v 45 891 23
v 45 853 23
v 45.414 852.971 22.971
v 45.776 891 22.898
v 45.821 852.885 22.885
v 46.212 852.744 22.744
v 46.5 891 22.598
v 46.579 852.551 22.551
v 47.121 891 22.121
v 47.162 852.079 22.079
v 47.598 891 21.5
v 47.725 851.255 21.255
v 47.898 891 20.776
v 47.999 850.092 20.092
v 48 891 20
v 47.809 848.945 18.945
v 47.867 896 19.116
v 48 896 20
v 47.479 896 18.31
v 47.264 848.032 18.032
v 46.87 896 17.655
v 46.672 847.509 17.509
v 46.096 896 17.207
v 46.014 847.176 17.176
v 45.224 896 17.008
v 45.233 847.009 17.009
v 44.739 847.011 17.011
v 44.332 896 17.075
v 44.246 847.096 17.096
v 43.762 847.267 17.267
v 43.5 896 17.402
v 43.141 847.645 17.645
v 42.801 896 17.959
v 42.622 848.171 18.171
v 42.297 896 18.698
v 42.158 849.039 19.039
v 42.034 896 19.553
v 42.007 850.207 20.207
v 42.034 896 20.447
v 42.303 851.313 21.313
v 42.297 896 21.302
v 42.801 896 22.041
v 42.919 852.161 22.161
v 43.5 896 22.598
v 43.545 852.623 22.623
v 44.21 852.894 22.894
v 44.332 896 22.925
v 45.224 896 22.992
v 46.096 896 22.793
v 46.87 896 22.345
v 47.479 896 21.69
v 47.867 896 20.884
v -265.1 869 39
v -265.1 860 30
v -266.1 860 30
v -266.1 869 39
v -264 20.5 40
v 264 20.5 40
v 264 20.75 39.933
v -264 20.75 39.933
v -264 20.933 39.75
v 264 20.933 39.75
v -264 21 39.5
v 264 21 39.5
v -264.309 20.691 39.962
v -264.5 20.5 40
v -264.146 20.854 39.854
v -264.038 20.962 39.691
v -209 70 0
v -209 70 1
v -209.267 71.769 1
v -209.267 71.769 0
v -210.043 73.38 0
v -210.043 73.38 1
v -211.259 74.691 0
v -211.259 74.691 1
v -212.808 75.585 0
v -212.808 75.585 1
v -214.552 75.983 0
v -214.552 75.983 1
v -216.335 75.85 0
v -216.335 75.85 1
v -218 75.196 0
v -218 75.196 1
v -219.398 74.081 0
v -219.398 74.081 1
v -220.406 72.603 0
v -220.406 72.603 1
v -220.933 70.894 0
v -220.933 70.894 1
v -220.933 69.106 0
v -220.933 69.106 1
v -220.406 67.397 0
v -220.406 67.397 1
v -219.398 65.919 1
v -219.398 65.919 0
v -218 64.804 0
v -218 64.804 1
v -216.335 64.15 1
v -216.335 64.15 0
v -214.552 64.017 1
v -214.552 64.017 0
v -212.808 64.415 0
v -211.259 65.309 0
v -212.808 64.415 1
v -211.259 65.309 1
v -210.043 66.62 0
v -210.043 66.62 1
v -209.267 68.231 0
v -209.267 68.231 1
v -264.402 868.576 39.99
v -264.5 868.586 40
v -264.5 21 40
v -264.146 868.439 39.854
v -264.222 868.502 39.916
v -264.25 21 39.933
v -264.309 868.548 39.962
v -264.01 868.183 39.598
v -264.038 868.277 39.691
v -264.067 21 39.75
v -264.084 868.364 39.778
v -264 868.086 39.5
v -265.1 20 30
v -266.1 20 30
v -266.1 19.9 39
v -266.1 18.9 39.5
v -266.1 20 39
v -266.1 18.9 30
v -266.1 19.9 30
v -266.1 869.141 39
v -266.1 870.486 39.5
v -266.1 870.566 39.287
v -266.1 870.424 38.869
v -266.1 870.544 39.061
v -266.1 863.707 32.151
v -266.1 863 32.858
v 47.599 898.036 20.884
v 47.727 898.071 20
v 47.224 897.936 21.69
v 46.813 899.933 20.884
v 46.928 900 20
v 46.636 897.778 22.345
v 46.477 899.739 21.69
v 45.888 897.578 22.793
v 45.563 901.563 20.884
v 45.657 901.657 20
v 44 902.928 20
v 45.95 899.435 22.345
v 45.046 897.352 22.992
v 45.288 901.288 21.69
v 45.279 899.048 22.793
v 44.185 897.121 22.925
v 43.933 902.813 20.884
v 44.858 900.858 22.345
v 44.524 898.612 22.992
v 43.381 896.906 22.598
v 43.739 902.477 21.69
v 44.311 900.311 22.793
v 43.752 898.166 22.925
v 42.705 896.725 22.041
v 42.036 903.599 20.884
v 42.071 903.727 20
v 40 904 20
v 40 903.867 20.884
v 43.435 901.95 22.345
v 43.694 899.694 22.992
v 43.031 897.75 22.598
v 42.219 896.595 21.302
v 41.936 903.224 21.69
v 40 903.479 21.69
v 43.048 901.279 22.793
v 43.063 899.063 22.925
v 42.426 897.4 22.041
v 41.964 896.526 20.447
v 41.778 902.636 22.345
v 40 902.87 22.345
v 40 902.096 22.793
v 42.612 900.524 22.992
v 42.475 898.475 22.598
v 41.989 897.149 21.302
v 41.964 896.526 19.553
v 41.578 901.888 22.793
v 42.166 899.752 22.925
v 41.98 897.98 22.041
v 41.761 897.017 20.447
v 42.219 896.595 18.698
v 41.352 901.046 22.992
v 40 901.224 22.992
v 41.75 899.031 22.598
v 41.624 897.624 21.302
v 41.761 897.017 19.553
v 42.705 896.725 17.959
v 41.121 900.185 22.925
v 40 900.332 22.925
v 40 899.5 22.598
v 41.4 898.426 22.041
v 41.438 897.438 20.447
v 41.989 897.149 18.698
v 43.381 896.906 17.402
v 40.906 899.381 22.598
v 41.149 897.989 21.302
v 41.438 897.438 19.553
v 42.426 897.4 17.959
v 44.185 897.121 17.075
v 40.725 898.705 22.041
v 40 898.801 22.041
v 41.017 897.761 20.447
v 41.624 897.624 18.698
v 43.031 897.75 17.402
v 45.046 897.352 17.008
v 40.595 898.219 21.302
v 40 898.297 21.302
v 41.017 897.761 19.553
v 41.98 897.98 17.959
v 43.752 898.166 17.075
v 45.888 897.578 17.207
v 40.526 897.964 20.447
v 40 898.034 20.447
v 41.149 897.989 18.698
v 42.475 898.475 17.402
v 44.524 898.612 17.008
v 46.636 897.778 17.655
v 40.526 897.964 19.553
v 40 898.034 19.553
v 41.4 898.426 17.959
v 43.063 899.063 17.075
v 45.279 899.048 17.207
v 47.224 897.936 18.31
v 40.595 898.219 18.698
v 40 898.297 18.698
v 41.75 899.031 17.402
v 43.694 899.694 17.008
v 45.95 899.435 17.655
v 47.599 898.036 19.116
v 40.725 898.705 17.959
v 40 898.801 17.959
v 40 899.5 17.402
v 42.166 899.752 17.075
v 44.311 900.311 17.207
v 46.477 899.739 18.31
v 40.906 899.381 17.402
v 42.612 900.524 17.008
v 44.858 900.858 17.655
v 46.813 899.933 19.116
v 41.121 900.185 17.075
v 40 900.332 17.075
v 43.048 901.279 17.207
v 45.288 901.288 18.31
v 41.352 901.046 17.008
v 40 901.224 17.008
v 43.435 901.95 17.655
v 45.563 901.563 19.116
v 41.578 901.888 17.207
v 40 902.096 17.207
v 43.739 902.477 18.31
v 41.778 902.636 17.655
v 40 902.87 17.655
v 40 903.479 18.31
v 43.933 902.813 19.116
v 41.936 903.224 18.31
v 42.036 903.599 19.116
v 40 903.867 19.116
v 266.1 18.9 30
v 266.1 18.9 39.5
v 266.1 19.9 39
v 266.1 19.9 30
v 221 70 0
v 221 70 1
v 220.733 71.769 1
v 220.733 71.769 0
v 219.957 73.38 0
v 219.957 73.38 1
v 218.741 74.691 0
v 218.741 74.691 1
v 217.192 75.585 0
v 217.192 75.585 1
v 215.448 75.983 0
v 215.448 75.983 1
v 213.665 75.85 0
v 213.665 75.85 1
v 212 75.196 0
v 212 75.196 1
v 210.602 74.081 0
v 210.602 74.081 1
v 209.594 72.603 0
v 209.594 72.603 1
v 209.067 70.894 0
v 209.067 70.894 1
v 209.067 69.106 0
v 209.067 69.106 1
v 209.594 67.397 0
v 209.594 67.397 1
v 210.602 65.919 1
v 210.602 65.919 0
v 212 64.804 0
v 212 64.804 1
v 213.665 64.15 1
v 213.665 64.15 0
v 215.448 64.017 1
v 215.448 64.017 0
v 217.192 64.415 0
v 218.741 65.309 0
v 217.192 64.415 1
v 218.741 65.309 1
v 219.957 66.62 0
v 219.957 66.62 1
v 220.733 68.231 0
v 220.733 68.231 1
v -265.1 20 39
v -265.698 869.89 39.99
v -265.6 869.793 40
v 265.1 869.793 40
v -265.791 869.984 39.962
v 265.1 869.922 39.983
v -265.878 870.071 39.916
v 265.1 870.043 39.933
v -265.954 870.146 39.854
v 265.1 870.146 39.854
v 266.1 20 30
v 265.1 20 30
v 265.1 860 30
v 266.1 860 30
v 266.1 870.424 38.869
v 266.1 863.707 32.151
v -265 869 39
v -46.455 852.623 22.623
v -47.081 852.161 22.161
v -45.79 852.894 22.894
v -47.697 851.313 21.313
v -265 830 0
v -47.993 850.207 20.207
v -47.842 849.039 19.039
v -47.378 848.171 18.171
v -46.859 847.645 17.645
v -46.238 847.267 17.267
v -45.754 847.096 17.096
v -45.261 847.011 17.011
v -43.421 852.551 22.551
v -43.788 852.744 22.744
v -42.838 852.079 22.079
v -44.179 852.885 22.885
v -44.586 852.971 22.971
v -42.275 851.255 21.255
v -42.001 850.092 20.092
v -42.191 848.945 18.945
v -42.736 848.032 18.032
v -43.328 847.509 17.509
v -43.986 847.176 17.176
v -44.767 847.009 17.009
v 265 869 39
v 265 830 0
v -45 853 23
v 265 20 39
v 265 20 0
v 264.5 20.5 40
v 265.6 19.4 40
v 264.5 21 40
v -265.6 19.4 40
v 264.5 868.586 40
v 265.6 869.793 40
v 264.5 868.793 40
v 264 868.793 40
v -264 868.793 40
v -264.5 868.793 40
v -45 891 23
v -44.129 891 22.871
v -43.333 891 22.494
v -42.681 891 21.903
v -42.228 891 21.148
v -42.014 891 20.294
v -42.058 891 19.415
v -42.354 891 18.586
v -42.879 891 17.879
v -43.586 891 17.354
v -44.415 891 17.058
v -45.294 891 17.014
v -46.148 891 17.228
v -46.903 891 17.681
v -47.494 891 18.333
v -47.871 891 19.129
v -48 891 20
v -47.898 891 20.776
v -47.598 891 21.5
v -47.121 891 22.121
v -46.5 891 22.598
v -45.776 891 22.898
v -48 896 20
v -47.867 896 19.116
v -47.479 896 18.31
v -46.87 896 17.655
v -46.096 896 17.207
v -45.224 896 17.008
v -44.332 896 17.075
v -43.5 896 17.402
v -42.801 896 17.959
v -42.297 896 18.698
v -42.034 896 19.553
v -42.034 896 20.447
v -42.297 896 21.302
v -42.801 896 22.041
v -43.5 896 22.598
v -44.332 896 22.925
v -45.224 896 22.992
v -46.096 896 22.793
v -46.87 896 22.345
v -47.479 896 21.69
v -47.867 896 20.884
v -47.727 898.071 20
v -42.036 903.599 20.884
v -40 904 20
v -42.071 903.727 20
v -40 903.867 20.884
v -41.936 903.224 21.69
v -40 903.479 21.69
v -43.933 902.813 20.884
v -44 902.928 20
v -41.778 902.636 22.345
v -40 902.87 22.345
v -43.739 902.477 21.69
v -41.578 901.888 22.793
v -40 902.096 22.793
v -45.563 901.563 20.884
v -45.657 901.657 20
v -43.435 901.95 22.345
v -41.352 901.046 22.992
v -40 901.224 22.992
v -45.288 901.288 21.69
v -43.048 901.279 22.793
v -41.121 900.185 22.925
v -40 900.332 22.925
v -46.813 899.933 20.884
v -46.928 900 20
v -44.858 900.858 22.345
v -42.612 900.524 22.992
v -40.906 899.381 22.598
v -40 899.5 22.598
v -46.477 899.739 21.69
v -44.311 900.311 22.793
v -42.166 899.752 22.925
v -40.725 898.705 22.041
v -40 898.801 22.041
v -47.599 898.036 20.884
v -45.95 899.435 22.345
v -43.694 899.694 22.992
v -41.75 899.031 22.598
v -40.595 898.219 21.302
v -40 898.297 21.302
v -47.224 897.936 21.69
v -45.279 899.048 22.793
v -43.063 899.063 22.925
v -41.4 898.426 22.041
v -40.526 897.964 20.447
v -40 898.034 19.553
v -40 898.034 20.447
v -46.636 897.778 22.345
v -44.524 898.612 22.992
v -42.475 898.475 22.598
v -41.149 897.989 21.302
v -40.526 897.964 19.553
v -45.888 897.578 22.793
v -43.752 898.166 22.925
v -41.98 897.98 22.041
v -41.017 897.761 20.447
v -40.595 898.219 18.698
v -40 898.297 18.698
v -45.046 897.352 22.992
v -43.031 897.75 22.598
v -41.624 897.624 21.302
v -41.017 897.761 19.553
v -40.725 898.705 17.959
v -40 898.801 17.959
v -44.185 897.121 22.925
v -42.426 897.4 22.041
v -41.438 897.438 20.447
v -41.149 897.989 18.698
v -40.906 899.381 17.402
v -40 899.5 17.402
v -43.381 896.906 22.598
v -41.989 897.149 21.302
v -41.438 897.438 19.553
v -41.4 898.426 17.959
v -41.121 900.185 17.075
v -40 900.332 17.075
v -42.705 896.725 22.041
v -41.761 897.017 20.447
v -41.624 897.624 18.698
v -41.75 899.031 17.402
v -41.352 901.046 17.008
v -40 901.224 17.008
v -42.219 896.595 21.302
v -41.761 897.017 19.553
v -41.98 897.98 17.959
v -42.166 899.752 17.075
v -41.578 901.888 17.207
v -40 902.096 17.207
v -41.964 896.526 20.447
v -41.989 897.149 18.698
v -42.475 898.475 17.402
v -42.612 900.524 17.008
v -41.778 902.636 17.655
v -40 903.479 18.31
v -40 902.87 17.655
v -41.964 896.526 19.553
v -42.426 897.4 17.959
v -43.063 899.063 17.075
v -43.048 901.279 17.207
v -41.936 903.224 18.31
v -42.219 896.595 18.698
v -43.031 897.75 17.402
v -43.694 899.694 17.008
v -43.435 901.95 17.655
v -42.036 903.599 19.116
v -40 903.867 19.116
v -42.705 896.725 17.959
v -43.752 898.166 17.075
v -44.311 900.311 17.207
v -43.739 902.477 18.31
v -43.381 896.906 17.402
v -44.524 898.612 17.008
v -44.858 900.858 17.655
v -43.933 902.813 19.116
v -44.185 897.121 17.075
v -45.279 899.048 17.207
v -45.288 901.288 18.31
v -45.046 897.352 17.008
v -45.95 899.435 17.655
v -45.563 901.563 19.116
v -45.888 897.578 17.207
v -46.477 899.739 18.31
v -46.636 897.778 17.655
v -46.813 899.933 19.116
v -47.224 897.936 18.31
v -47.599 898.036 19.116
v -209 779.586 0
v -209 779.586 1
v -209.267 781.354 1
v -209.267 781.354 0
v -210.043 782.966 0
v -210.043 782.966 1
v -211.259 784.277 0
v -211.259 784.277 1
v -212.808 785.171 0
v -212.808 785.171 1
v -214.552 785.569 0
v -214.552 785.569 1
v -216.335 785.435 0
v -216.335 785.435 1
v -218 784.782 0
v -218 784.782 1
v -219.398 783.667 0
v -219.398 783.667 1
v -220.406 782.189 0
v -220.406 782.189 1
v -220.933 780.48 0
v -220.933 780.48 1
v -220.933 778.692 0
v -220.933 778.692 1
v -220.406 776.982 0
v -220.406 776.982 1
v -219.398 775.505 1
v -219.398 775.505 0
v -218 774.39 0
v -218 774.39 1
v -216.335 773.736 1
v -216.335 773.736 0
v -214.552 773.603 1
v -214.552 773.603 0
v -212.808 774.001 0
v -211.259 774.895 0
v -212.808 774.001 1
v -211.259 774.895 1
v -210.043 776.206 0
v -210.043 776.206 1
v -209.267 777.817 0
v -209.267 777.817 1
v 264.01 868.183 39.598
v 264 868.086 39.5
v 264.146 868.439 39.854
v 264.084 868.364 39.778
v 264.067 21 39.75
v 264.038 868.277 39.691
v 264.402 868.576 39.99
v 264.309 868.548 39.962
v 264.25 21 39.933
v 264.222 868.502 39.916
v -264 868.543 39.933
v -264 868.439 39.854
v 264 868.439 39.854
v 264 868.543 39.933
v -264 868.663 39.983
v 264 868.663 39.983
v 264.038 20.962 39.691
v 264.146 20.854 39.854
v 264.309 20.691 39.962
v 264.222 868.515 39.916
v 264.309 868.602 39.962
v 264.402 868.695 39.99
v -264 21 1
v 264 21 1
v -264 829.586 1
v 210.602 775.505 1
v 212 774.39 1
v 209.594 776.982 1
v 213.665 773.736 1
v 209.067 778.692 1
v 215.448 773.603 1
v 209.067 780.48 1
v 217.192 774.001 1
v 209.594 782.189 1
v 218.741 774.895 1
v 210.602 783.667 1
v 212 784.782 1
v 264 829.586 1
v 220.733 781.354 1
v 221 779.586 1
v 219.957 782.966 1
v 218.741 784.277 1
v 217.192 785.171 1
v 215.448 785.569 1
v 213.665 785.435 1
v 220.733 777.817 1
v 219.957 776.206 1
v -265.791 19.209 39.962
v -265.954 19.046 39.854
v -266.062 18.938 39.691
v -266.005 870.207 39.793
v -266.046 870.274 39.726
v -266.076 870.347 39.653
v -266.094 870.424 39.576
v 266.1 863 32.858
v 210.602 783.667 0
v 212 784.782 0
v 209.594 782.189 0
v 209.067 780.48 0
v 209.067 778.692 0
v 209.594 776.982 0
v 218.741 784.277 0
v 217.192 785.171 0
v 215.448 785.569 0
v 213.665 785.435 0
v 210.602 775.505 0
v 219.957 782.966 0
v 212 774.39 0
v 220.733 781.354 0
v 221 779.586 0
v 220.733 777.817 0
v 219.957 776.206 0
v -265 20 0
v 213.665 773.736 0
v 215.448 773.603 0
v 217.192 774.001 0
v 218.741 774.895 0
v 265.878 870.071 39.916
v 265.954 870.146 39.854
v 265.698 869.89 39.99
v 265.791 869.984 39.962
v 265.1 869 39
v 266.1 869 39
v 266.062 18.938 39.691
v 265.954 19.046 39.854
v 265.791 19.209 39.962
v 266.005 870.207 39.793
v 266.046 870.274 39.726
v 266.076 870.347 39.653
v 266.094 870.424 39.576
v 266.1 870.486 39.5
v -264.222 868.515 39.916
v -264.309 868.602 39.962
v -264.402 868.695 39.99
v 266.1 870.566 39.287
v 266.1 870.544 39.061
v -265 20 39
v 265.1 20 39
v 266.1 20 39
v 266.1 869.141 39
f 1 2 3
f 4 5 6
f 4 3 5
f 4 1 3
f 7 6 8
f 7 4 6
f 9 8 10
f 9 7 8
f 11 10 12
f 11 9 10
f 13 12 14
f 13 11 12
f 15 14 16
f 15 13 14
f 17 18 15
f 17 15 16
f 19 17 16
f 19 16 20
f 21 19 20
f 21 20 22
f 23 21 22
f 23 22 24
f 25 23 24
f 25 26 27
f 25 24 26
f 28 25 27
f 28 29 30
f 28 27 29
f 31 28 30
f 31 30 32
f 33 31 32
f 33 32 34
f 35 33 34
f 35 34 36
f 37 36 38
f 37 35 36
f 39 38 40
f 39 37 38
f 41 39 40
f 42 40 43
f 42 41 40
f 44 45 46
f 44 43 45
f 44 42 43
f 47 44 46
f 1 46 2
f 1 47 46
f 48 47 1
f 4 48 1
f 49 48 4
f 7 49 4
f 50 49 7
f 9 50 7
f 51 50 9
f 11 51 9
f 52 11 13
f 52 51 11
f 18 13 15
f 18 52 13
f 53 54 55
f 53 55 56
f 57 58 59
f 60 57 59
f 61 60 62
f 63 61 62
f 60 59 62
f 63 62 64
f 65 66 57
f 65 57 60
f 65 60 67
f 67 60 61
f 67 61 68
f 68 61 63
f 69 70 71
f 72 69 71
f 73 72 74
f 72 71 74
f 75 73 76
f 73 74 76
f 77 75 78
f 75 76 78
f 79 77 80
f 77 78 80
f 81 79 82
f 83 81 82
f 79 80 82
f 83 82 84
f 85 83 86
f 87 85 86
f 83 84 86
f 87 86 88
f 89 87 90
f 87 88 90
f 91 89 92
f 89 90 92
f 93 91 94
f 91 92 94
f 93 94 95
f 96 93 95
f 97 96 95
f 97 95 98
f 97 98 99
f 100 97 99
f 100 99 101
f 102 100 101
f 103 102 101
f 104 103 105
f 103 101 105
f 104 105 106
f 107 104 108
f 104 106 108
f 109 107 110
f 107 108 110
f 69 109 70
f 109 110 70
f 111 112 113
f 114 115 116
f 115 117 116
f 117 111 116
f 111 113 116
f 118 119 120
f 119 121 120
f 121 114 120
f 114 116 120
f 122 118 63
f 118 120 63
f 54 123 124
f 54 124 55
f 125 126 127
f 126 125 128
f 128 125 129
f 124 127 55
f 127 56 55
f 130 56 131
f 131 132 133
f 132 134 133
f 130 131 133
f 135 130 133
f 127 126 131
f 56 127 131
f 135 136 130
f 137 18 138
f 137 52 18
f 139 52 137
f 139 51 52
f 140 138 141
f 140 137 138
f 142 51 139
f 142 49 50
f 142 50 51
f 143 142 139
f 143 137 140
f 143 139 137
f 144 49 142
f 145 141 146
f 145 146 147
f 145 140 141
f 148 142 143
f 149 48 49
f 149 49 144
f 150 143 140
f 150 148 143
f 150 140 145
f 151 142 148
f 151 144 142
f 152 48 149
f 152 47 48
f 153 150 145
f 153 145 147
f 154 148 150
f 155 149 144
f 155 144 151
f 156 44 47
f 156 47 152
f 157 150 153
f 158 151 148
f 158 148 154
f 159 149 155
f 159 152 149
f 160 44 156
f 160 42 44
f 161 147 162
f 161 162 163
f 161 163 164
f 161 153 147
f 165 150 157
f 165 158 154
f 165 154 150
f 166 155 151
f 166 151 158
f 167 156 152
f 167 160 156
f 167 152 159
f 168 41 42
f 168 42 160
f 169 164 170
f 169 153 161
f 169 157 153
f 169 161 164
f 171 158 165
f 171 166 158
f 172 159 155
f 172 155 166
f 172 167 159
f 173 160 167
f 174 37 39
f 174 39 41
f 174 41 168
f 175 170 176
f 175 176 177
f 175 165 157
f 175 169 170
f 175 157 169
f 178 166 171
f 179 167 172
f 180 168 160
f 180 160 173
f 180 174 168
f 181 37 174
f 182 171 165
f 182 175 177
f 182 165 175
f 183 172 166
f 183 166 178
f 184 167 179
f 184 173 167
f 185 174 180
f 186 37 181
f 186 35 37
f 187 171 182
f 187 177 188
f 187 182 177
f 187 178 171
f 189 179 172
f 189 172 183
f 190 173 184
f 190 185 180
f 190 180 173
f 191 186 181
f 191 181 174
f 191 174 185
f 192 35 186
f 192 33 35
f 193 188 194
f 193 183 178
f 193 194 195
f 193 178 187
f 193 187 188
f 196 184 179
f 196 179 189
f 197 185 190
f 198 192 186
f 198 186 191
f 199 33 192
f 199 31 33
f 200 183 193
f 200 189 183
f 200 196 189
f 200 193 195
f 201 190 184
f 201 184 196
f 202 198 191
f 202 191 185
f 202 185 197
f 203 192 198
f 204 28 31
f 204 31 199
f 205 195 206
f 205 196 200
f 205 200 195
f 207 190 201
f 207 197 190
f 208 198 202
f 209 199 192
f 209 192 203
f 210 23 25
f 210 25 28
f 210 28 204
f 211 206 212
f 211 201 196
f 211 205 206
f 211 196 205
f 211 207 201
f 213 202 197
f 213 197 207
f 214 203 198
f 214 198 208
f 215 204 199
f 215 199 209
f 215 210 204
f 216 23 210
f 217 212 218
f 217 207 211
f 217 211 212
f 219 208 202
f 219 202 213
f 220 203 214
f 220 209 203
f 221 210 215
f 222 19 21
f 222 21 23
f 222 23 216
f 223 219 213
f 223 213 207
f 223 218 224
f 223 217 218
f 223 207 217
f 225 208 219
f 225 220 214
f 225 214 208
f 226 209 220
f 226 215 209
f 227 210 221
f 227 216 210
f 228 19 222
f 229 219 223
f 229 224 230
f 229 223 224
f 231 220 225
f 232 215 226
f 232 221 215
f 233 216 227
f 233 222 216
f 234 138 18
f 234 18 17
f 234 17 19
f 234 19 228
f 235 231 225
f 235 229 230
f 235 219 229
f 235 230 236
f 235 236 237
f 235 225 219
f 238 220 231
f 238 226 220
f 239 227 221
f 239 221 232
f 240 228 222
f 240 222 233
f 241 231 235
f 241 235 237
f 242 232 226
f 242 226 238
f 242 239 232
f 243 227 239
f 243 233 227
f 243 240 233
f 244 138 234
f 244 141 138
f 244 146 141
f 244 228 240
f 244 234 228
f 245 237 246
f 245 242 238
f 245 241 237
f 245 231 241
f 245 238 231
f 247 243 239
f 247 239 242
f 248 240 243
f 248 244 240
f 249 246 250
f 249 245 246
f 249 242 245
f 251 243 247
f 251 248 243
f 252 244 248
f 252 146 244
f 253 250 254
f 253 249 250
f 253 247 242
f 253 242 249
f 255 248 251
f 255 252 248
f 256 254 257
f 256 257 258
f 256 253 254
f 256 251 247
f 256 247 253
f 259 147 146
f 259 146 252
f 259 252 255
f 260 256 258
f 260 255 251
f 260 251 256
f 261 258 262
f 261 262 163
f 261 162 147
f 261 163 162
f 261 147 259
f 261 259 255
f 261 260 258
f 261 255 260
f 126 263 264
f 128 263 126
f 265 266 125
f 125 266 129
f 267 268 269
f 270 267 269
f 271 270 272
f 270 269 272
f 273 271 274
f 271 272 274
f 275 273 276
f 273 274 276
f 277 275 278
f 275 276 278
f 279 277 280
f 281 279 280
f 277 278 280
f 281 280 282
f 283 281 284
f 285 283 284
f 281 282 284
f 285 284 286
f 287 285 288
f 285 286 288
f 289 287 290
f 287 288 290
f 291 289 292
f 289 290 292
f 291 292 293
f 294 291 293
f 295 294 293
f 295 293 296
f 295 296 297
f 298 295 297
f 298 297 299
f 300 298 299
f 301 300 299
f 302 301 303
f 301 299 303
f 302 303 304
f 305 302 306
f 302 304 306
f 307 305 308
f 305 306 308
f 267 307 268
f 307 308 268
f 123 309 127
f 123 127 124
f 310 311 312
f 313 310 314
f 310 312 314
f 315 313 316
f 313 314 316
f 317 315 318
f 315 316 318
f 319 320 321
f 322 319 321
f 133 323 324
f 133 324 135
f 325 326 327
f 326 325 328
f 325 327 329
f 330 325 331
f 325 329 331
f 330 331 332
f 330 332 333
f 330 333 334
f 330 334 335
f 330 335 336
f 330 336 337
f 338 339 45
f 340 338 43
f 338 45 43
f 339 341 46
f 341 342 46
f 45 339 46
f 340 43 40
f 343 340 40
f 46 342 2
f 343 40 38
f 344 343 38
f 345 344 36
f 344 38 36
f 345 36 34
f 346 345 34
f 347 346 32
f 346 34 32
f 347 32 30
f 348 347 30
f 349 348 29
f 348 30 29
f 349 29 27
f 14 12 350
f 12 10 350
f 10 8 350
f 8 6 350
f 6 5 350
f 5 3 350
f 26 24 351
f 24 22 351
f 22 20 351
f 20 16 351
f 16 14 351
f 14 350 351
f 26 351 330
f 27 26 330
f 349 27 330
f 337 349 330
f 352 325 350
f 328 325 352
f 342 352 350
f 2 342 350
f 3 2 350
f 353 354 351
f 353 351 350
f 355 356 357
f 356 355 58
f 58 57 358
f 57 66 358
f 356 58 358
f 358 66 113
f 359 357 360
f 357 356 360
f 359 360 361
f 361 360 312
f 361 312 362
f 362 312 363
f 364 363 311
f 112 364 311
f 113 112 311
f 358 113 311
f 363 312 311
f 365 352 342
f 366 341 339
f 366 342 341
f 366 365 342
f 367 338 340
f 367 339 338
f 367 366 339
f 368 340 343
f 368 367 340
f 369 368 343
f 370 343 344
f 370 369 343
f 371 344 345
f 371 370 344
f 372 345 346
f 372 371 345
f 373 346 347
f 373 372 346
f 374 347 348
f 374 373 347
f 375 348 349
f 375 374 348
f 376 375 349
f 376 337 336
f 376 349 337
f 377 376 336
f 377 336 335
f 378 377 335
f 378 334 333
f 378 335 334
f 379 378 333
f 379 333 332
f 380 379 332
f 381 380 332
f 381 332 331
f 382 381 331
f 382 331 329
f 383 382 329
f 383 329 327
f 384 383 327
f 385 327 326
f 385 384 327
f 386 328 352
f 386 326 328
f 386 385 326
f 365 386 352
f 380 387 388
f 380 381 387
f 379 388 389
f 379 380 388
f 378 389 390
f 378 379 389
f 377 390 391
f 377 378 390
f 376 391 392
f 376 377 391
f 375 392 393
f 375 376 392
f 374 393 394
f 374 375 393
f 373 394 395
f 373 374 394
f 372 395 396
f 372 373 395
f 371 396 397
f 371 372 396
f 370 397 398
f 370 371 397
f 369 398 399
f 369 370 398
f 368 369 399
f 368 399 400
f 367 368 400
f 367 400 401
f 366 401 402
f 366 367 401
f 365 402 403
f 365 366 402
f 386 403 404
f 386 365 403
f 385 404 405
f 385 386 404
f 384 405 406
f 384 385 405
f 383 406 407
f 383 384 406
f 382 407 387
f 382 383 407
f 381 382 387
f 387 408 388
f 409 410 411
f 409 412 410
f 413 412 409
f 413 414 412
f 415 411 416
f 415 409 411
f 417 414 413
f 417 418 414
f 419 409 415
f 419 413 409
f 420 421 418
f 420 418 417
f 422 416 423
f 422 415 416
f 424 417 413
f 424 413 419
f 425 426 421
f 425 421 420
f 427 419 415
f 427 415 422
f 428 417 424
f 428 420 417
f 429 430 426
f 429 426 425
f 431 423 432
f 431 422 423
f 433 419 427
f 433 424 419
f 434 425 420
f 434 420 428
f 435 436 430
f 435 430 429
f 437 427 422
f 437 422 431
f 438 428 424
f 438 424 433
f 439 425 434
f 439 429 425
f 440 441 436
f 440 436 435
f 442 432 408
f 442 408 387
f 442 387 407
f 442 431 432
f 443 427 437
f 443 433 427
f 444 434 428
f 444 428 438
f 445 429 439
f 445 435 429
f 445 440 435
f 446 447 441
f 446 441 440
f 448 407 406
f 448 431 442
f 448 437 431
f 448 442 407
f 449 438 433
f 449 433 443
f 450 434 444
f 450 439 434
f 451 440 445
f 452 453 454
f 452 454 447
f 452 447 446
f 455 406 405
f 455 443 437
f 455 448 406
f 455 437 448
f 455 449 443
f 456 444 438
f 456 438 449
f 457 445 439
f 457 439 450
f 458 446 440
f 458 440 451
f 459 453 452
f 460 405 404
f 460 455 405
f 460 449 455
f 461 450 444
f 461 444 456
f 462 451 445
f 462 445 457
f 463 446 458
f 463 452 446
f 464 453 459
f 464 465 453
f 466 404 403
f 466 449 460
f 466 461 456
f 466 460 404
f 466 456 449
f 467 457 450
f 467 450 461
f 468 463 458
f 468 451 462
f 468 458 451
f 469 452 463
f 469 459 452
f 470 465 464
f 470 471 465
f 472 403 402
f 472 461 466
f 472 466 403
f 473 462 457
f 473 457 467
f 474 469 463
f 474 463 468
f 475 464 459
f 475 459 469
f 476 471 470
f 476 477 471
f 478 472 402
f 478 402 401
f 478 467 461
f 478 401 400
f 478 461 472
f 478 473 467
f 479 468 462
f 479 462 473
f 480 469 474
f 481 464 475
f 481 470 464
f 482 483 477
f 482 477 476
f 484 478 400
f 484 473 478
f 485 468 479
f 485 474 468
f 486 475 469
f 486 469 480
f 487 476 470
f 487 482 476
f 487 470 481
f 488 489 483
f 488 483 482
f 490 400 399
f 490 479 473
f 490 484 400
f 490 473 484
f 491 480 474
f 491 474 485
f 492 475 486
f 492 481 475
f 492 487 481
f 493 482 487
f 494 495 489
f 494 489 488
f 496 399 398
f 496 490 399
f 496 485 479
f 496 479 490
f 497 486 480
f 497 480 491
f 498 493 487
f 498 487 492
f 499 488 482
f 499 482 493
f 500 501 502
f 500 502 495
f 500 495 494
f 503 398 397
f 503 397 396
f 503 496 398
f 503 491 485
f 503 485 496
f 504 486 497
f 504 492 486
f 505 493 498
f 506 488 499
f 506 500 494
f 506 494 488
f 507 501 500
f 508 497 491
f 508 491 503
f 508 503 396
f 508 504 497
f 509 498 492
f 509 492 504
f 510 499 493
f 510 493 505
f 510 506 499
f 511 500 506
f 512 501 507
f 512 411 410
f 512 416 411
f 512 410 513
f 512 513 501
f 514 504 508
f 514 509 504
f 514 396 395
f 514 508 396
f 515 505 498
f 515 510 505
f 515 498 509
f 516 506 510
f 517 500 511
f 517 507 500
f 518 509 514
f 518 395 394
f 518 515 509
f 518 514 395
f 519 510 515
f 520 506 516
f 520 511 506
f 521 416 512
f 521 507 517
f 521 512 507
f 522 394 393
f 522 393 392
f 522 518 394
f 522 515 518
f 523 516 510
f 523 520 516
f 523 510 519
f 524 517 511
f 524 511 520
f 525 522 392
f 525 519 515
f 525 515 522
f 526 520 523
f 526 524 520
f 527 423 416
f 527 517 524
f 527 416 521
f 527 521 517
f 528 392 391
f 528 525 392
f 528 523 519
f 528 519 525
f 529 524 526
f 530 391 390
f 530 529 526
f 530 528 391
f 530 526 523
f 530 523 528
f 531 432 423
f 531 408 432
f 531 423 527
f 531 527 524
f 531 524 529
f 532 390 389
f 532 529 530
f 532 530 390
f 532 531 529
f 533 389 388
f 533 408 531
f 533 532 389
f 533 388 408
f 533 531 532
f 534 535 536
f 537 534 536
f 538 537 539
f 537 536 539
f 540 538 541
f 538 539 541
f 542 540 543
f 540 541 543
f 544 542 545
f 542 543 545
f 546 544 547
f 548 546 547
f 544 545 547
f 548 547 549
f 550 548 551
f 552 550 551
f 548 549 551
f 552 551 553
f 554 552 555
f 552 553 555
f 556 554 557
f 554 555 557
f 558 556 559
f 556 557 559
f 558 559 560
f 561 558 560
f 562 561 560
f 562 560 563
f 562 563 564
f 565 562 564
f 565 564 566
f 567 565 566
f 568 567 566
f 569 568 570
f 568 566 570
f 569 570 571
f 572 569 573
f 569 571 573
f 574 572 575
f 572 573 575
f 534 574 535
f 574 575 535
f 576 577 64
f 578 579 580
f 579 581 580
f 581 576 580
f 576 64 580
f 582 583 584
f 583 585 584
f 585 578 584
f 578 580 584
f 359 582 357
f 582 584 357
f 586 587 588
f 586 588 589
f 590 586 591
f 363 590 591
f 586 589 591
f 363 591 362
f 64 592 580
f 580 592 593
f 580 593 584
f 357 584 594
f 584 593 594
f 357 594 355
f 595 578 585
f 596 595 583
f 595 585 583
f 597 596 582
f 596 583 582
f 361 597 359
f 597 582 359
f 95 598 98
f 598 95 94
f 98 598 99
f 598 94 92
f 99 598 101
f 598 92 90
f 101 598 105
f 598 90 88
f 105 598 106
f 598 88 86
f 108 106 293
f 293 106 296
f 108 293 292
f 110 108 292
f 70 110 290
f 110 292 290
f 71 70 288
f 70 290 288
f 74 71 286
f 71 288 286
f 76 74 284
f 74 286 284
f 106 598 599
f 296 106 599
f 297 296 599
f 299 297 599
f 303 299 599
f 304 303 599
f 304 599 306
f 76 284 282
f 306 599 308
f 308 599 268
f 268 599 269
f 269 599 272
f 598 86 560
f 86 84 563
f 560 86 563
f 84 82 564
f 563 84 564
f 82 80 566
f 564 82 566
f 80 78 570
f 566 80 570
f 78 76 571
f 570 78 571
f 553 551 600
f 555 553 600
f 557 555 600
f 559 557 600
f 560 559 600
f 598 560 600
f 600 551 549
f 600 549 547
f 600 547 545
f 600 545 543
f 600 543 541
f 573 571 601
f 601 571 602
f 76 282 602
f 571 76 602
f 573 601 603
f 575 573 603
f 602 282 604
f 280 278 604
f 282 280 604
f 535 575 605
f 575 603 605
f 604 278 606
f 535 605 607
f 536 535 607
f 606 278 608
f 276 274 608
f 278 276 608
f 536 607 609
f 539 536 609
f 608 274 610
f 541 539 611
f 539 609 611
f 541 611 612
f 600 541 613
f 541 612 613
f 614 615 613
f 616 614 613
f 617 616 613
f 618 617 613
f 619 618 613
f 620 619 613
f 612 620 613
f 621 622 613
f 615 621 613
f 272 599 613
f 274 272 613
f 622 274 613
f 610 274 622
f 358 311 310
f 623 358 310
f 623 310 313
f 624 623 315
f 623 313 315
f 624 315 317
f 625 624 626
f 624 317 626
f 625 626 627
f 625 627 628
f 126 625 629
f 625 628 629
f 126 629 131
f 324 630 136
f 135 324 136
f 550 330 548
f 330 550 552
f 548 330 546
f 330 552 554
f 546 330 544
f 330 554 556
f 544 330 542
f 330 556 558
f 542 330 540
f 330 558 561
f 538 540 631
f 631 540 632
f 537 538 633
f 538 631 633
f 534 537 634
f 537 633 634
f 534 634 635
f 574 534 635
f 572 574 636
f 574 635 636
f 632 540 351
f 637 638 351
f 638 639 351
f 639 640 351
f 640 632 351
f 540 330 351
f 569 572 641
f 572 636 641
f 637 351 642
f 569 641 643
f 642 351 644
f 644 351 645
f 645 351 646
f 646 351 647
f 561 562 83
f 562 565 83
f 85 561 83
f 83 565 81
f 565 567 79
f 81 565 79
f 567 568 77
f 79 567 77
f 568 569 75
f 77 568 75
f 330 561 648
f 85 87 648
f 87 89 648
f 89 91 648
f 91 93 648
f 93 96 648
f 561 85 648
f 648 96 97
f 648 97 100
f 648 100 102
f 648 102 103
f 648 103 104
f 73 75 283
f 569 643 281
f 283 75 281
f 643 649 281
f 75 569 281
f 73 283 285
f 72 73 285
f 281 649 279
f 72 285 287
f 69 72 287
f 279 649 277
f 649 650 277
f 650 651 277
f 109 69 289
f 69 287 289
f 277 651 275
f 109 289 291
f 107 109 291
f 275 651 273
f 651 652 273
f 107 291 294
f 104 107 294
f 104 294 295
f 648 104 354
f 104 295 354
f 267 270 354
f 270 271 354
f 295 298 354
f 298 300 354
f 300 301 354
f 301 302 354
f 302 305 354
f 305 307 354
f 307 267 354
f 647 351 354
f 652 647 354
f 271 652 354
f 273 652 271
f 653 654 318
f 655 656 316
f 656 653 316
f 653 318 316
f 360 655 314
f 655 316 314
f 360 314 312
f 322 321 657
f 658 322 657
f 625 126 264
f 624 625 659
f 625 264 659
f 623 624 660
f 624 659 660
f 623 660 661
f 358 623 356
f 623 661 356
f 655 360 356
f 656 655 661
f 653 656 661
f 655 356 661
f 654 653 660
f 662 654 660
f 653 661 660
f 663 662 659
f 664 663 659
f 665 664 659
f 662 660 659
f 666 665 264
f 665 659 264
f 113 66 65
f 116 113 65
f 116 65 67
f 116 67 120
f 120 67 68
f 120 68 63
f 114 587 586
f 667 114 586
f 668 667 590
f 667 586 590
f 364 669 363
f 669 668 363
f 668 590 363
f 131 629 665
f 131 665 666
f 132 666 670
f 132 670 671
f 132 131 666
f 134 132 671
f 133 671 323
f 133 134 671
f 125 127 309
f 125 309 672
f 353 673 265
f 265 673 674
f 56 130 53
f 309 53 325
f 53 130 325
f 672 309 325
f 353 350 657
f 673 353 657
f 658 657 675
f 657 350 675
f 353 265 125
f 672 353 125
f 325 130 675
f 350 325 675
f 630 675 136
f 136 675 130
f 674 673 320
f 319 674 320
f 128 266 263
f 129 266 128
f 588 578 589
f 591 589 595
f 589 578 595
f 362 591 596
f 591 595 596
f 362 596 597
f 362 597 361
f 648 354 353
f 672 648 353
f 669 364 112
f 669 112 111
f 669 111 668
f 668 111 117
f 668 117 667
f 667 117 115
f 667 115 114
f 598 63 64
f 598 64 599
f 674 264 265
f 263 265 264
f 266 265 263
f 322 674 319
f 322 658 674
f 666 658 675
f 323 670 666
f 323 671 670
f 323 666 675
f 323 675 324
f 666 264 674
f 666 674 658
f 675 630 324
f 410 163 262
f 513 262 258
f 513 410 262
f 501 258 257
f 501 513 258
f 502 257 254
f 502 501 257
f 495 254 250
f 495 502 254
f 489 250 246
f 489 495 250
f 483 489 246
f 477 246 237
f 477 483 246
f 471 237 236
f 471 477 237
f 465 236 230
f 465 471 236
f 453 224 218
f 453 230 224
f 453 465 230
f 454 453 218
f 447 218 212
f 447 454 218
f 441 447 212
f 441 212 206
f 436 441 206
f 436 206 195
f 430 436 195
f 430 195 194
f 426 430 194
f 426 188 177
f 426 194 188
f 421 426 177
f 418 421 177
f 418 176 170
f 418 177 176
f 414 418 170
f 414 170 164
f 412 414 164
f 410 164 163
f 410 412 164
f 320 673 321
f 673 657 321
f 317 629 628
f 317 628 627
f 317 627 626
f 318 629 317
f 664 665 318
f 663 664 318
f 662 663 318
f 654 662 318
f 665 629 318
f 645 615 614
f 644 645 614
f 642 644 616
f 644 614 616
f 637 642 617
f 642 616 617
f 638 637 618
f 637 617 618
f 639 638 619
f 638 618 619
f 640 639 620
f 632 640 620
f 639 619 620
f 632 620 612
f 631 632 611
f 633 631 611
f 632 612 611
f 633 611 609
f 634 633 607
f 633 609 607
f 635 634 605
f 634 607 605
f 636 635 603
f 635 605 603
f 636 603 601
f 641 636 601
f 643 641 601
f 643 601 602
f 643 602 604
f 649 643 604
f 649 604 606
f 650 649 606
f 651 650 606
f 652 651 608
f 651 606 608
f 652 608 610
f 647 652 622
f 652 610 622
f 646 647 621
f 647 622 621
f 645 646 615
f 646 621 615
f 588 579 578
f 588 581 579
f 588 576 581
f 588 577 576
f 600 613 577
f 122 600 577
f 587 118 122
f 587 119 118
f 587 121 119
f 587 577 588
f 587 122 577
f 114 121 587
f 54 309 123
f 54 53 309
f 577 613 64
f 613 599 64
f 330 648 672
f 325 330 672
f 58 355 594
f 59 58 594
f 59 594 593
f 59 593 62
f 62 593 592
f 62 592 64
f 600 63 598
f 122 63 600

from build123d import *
from build123d.topology import SkipClean

# Parameters (mm, degrees)
BOSS_EXTRUDE1_DEPTH  = 265
BOSS_EXTRUDE2_DEPTH  = 1
BOSS_EXTRUDE3_DEPTH  = 1
SKETCH5_R            = 6
CUT_EXTRUDE1_DEPTH   = 1
BOSS_EXTRUDE5_REACH  = 913.299
SKETCH6_R            = 3
SKETCH10_R           = 3
BOSS_EXTRUDE7_DEPTH  = 1
BOSS_EXTRUDE8_DEPTH  = 1
SKETCH16_W           = 532.2
SKETCH16_H           = 10
BOSS_EXTRUDE9_DEPTH  = 1
SKETCH18_W           = 532.2
SKETCH18_H           = 10
BOSS_EXTRUDE10_DEPTH = 1
SKETCH19_W           = 532.2
SKETCH19_H           = 851.170710678
SKETCH19_W_2         = 528
SKETCH19_H_2         = 847.585786438
BOSS_EXTRUDE11_DEPTH = 1
CUT_EXTRUDE2_DEPTH   = 532.2
FILLET1_R            = 0.5
FILLET2_START        = -267
FILLET2_DEPTH        = 534


with BuildPart() as part:
    # Sketch2 → Boss-Extrude1 (new, symmetric)
    with BuildSketch(Plane(origin=(0, 0, 0), x_dir=(0, 0, -1), z_dir=(1, 0, 0))):
        Polygon((0, 20), (-40, 20), (-40, 21), (-1, 21), (-1, 829.585786438), (-40, 868.585786438), (-40, 870), (0, 830), align=None)
    extrude(amount=BOSS_EXTRUDE1_DEPTH, both=True)

    # Sketch3 → Boss-Extrude2 (add)
    with BuildSketch(Plane(origin=(265, 0, 0), x_dir=(0, 0, -1), z_dir=(1, 0, 0))):
        Polygon((-40, 870), (0, 830), (0, 20), (-40, 20), align=None)
    extrude(amount=-BOSS_EXTRUDE2_DEPTH)

    # Sketch4 → Boss-Extrude3 (add)
    with BuildSketch(Plane.ZY.offset(265)):
        Polygon((40, 870), (0, 830), (0, 20), (40, 20), align=None)
    extrude(amount=-BOSS_EXTRUDE3_DEPTH)

    # Sketch5 → Cut-Extrude1 (cut)
    with BuildSketch(Plane.XY.offset(1)):
        with Locations((215, 779.585786438)):
            Circle(SKETCH5_R)
        with Locations((215, 70)):
            Circle(SKETCH5_R)
        with Locations((-215, 779.585786438)):
            Circle(SKETCH5_R)
        with Locations((-215, 70)):
            Circle(SKETCH5_R)
    extrude(amount=-CUT_EXTRUDE1_DEPTH, mode=Mode.SUBTRACT)

    # Boss-Extrude5: up to this plane
    boss_extrude5_end = Plane(origin=(265, 870, 40), z_dir=(0, -0.7071067811865444, 0.7071067811865508))
    # Sketch6 → Boss-Extrude5 (add, up to the surface)
    with BuildSketch(Plane(origin=(0, 891, 0), x_dir=(1, 0, 0), z_dir=(0, 1, 0)), mode=Mode.PRIVATE) as boss_extrude5_sk1:
        with Locations(Location((-45, -20, 0), (0, 0, 270))):
            Circle(SKETCH6_R)
    boss_extrude5_tool1 = split(extrude(boss_extrude5_sk1.sketch, amount=-BOSS_EXTRUDE5_REACH, mode=Mode.PRIVATE), bisect_by=boss_extrude5_end, keep=Keep.BOTH, mode=Mode.PRIVATE)
    add(boss_extrude5_tool1.solids().sort_by_distance((-45, 891, 20))[0])
    # Sketch6 → Boss-Extrude5 (add, up to the surface)
    with BuildSketch(Plane(origin=(0, 891, 0), x_dir=(1, 0, 0), z_dir=(0, 1, 0)), mode=Mode.PRIVATE) as boss_extrude5_sk2:
        with Locations(Location((45, -20, 0), (0, 0, 270))):
            Circle(SKETCH6_R)
    boss_extrude5_tool2 = split(extrude(boss_extrude5_sk2.sketch, amount=-BOSS_EXTRUDE5_REACH, mode=Mode.PRIVATE), bisect_by=boss_extrude5_end, keep=Keep.BOTH, mode=Mode.PRIVATE)
    add(boss_extrude5_tool2.solids().sort_by_distance((45, 891, 20))[0])

    # Sweep1: sweep along a path in Sketch9
    with SkipClean():  # the faces are left unmerged after this step: merging them gives an invalid solid
        with BuildLine(Plane(origin=(0, 0, 20), x_dir=(-1, 0, 0), z_dir=(0, 0, -1))) as sweep1_path:
            Line((-45, 891), (-45, 896))
            ThreePointArc((-45, 896), (-43.535533906, 899.535533906), (-40, 901))
            Line((-40, 901), (40, 901))
            ThreePointArc((40, 901), (43.535533906, 899.535533906), (45, 896))
            Line((45, 896), (45, 891))
        # Sketch10 → Sweep1 (sweep)
        with BuildSketch(Plane(origin=(0, 891, 0), x_dir=(1, 0, 0), z_dir=(0, 1, 0))):
            with Locations((45, -20)):
                Circle(SKETCH10_R)
        sweep(path=sweep1_path.line)



with BuildPart() as body_2:
    # Sketch13 → Boss-Extrude7 (new body)
    with BuildSketch(Plane(origin=(265.1, 0, 0), x_dir=(0, 0, -1), z_dir=(1, 0, 0))):
        Polygon((-30, 20), (-30, 860), (-40, 870), (-40, 20), align=None)
    extrude(amount=BOSS_EXTRUDE7_DEPTH)


with BuildPart() as body_3:
    # Sketch15 → Boss-Extrude8 (new body)
    with BuildSketch(Plane.ZY.offset(265.1)):
        Polygon((30, 20), (30, 860), (40, 870), (40, 20), align=None)
    extrude(amount=BOSS_EXTRUDE8_DEPTH)


with BuildPart() as body_4:
    # Sketch16 → Boss-Extrude9 (new body)
    with BuildSketch(Plane(origin=(0, 19.9, 0), x_dir=(-1, 0, 0), z_dir=(0, -1, 0))):
        with Locations((0, -35)):
            Rectangle(SKETCH16_W, SKETCH16_H)
    extrude(amount=BOSS_EXTRUDE9_DEPTH)


with BuildPart() as body_5:
    # Sketch18 → Boss-Extrude10 (new body)
    with BuildSketch(Plane(origin=(0, 415.070710678, -415.070710678), x_dir=(-1, 0, 0), z_dir=(0, 0.7071067811865445, -0.7071067811865507))):
        with Locations((0, 638.46717088)):
            Rectangle(SKETCH18_W, SKETCH18_H)
    extrude(amount=BOSS_EXTRUDE10_DEPTH)


with BuildPart() as part_1:
    with SkipClean():  # the faces are left unmerged after this step: merging them gives an invalid solid
        add(part.part)

        add(body_2.part)  # Boss-Extrude11 merges body 2

        add(body_3.part)  # Boss-Extrude11 merges body 3

        add(body_4.part)  # Boss-Extrude11 merges body 4

        add(body_5.part)  # Boss-Extrude11 merges body 5
        # Sketch19 → Boss-Extrude11 (add)
        with BuildSketch(Plane.XY.offset(40)):
            with Locations((0, 444.485355339)):
                Rectangle(SKETCH19_W, SKETCH19_H)
            with Locations((0, 444.792893219)):
                Rectangle(SKETCH19_W_2, SKETCH19_H_2, mode=Mode.SUBTRACT)
        extrude(amount=-BOSS_EXTRUDE11_DEPTH)

    # Sketch20 → Cut-Extrude2 (cut)
    with SkipClean():  # the faces are left unmerged after this step: merging them gives an invalid solid
        with BuildSketch(Plane(origin=(266.1, 0, 0), x_dir=(0, 0, -1), z_dir=(1, 0, 0))):
            Polygon((-39.929289322, 870.070710678), (-40, 870), (-40, 870.070710678), align=None)
        extrude(amount=-CUT_EXTRUDE2_DEPTH, mode=Mode.SUBTRACT)

    # Fillet1
    # the kernel refuses this fillet: 0.5 mm, written as the material it takes off along each edge
    with BuildSketch(Plane(origin=(267.35, 18.9, 40), x_dir=(0, 1, 0), z_dir=(-1, 0, 0))) as fillet1_piece_1:
        with BuildLine():
            CenterArc((FILLET1_R, FILLET1_R), FILLET1_R, 180, 90)
            Line((0, FILLET1_R), (0, 0))
            Line((0, 0), (FILLET1_R, 0))
        make_face()
    extrude(amount=534.7, mode=Mode.SUBTRACT)
    with BuildSketch(Plane(origin=(266.1, 871.25, 40), x_dir=(0, 0, -1), z_dir=(0, -1, 0))) as fillet1_piece_2:
        with BuildLine():
            CenterArc((FILLET1_R, -FILLET1_R), FILLET1_R, 90, 90)
            Line((0, -FILLET1_R), (0, 0))
            Line((0, 0), (FILLET1_R, 0))
        make_face()
    extrude(amount=851.25, mode=Mode.SUBTRACT)
    with BuildSketch(Plane(origin=(-266.1, 871.25, 40), x_dir=(0, 0, -1), z_dir=(0, -1, 0))) as fillet1_piece_3:
        with BuildLine():
            CenterArc((FILLET1_R, FILLET1_R), FILLET1_R, 180, 90)
            Line((0, FILLET1_R), (0, 0))
            Line((0, 0), (FILLET1_R, 0))
        make_face()
    extrude(amount=851.25, mode=Mode.SUBTRACT)
    with BuildSketch(Plane(origin=(265, 870, 40), x_dir=(0, 0.7071067811869935, -0.7071067811861015), z_dir=(-1, 0, 0))) as fillet1_piece_4:
        with BuildLine():
            CenterArc((FILLET1_R * 0.414213562373, FILLET1_R), FILLET1_R, 225, 45)
            Line((-FILLET1_R * 0.292893218814, FILLET1_R * 0.292893218813), (0, 0))
            Line((0, 0), (FILLET1_R * 0.414213562373, 0))
        make_face()
    extrude(amount=530, mode=Mode.SUBTRACT)
    with BuildSketch(Plane(origin=(264, 21, 40), x_dir=(0, -1, 0), z_dir=(-1, 0, 0))) as fillet1_piece_5:
        with BuildLine():
            CenterArc((FILLET1_R, -FILLET1_R), FILLET1_R, 90, 90)
            Line((0, -FILLET1_R), (0, 0))
            Line((0, 0), (FILLET1_R, 0))
        make_face()
    extrude(amount=528, mode=Mode.SUBTRACT)
    with BuildSketch(Plane(origin=(264, 868.585786438, 40), x_dir=(0, -0.7071067811865132, -0.7071067811865818), z_dir=(-1, 0, 0))) as fillet1_piece_6:
        with BuildLine():
            CenterArc((FILLET1_R * 0.414213562373, -FILLET1_R), FILLET1_R, 90, 45)
            Line((-FILLET1_R * 0.292893218813, -FILLET1_R * 0.292893218813), (0, 0))
            Line((0, 0), (FILLET1_R * 0.414213562373, 0))
        make_face()
    extrude(amount=528, mode=Mode.SUBTRACT)
    with BuildSketch(Plane(origin=(264, 21, 40), x_dir=(1, 0, 0), z_dir=(0, 1, 0))) as fillet1_piece_7_section:
        with BuildLine():
            CenterArc((FILLET1_R, FILLET1_R), FILLET1_R, 180, 90)
            Line((0, FILLET1_R), (0, 0))
            Line((0, 0), (FILLET1_R, 0))
        make_face()
    fillet1_piece_7 = extrude(amount=848.835786438, mode=Mode.PRIVATE)
    fillet1_piece_7 = split(fillet1_piece_7, bisect_by=Plane(origin=(264, 444.792893219, -383.792893219), z_dir=(0, -0.7071067811865426, 0.7071067811865525)), keep=Keep.TOP, mode=Mode.PRIVATE)
    add(fillet1_piece_7, mode=Mode.SUBTRACT)
    with BuildSketch(Plane(origin=(-264, 21, 40), x_dir=(-1, 0, 0), z_dir=(0, 1, 0))) as fillet1_piece_8_section:
        with BuildLine():
            CenterArc((FILLET1_R, -FILLET1_R), FILLET1_R, 90, 90)
            Line((0, -FILLET1_R), (0, 0))
            Line((0, 0), (FILLET1_R, 0))
        make_face()
    fillet1_piece_8 = extrude(amount=848.835786438, mode=Mode.PRIVATE)
    fillet1_piece_8 = split(fillet1_piece_8, bisect_by=Plane(origin=(-264, 444.792893219, -383.792893219), z_dir=(0, -0.7071067811865426, 0.7071067811865525)), keep=Keep.TOP, mode=Mode.PRIVATE)
    add(fillet1_piece_8, mode=Mode.SUBTRACT)
    with BuildSketch(Plane(origin=(265.1, 870, 40), x_dir=(0, -1, 0), z_dir=(-1, 0, 0)), Plane(origin=(-265, 870, 40), x_dir=(0, -1, 0), z_dir=(-1, 0, 0))) as fillet1_piece_9:
        with BuildLine():
            CenterArc((FILLET1_R * 0.414213562373, -FILLET1_R), FILLET1_R, 90, 45)
            Line((-FILLET1_R * 0.292893218814, -FILLET1_R * 0.292893218814), (0, 0))
            Line((0, 0), (FILLET1_R * 0.414213562373, 0))
        make_face()
    extrude(amount=0.1, mode=Mode.SUBTRACT)
    with BuildSketch(Plane(origin=(-265.1, 870, 40), x_dir=(0, 0.7071067811869935, -0.7071067811861015), z_dir=(-1, 0, 0))) as fillet1_piece_10:
        with BuildLine():
            CenterArc((FILLET1_R * 0.414213562373, FILLET1_R), FILLET1_R, 225, 45)
            Line((-FILLET1_R * 0.292893218814, FILLET1_R * 0.292893218813), (0, 0))
            Line((0, 0), (FILLET1_R * 0.414213562373, 0))
        make_face()
    extrude(amount=1.517766953, mode=Mode.SUBTRACT)
    with BuildSketch(Plane(origin=(265.1, 870, 40), x_dir=(0, 0.7071067811869935, -0.7071067811861015), z_dir=(1, 0, 0))) as fillet1_piece_11:
        with BuildLine():
            CenterArc((FILLET1_R * 0.414213562373, -FILLET1_R), FILLET1_R, 90, 45)
            Line((-FILLET1_R * 0.292893218814, -FILLET1_R * 0.292893218813), (0, 0))
            Line((0, 0), (FILLET1_R * 0.414213562373, 0))
        make_face()
    extrude(amount=1.517766953, mode=Mode.SUBTRACT)
    with BuildSketch(Plane(origin=(-266.1, 20, 40), x_dir=(0, 0, -1), z_dir=(0, -1, 0)), Plane(origin=(266.1, 19.9, 40), x_dir=(0, 0, -1), z_dir=(0, 1, 0))) as fillet1_piece_12:
        with BuildLine():
            CenterArc((FILLET1_R, FILLET1_R), FILLET1_R, 180, 90)
            Line((0, FILLET1_R), (0, 0))
            Line((0, 0), (FILLET1_R, 0))
        make_face()
    extrude(amount=0.1, mode=Mode.SUBTRACT)
    with BuildSketch(Plane(origin=(-266.1, 19.9, 40), x_dir=(0, 0, -1), z_dir=(0, -1, 0))) as fillet1_piece_13:
        with BuildLine():
            CenterArc((FILLET1_R, FILLET1_R), FILLET1_R, 180, 90)
            Line((0, FILLET1_R), (0, 0))
            Line((0, 0), (FILLET1_R, 0))
        make_face()
    extrude(amount=2.25, mode=Mode.SUBTRACT)
    with BuildSketch(Plane(origin=(266.1, 19.9, 40), x_dir=(0, 0, -1), z_dir=(0, -1, 0))) as fillet1_piece_14:
        with BuildLine():
            CenterArc((FILLET1_R, -FILLET1_R), FILLET1_R, 90, 90)
            Line((0, -FILLET1_R), (0, 0))
            Line((0, 0), (FILLET1_R, 0))
        make_face()
    extrude(amount=2.25, mode=Mode.SUBTRACT)
    with BuildSketch(Plane(origin=(265.25, 21, 40), x_dir=(0, -1, 0), z_dir=(-1, 0, 0))) as fillet1_piece_15a_section:
        with BuildLine():
            CenterArc((FILLET1_R, -FILLET1_R), FILLET1_R, 90, 90)
            Line((0, -FILLET1_R), (0, 0))
            Line((0, 0), (FILLET1_R, 0))
        make_face()
    fillet1_piece_15a = extrude(amount=529.25, mode=Mode.PRIVATE)
    fillet1_piece_15a = split(fillet1_piece_15a, bisect_by=Plane(origin=(264, 21, 40), z_dir=(1, 0, 0)), keep=Keep.TOP, mode=Mode.PRIVATE)
    with BuildSketch(Plane(origin=(264, 19.75, 40), x_dir=(1, 0, 0), z_dir=(0, 1, 0))) as fillet1_piece_15b_section:
        with BuildLine():
            CenterArc((FILLET1_R, FILLET1_R), FILLET1_R, 180, 90)
            Line((0, FILLET1_R), (0, 0))
            Line((0, 0), (FILLET1_R, 0))
        make_face()
    fillet1_piece_15b = extrude(amount=850.085786438, mode=Mode.PRIVATE)
    fillet1_piece_15b = split(fillet1_piece_15b, bisect_by=Plane(origin=(264, 21, 40), z_dir=(0, -1, 0)), keep=Keep.TOP, mode=Mode.PRIVATE)
    fillet1_piece_15 = fillet1_piece_15a & fillet1_piece_15b
    add(fillet1_piece_15, mode=Mode.SUBTRACT)
    with BuildSketch(Plane(origin=(-264, 19.75, 40), x_dir=(-1, 0, 0), z_dir=(0, 1, 0))) as fillet1_piece_16a_section:
        with BuildLine():
            CenterArc((FILLET1_R, -FILLET1_R), FILLET1_R, 90, 90)
            Line((0, -FILLET1_R), (0, 0))
            Line((0, 0), (FILLET1_R, 0))
        make_face()
    fillet1_piece_16a = extrude(amount=850.085786438, mode=Mode.PRIVATE)
    fillet1_piece_16a = split(fillet1_piece_16a, bisect_by=Plane(origin=(-264, 21, 40), z_dir=(0, -1, 0)), keep=Keep.TOP, mode=Mode.PRIVATE)
    with BuildSketch(Plane(origin=(264, 21, 40), x_dir=(0, -1, 0), z_dir=(-1, 0, 0))) as fillet1_piece_16b_section:
        with BuildLine():
            CenterArc((FILLET1_R, -FILLET1_R), FILLET1_R, 90, 90)
            Line((0, -FILLET1_R), (0, 0))
            Line((0, 0), (FILLET1_R, 0))
        make_face()
    fillet1_piece_16b = extrude(amount=529.25, mode=Mode.PRIVATE)
    fillet1_piece_16b = split(fillet1_piece_16b, bisect_by=Plane(origin=(-264, 21, 40), z_dir=(-1, 0, 0)), keep=Keep.TOP, mode=Mode.PRIVATE)
    fillet1_piece_16 = fillet1_piece_16a & fillet1_piece_16b
    add(fillet1_piece_16, mode=Mode.SUBTRACT)
    with BuildSketch(Plane(origin=(264.517766953, 868.585786438, 40), x_dir=(0, -0.7071067811865132, -0.7071067811865818), z_dir=(-1, 0, 0))) as fillet1_piece_17a_section:
        with BuildLine():
            CenterArc((FILLET1_R * 0.414213562373, -FILLET1_R), FILLET1_R, 90, 45)
            Line((-FILLET1_R * 0.292893218813, -FILLET1_R * 0.292893218813), (0, 0))
            Line((0, 0), (FILLET1_R * 0.414213562373, 0))
        make_face()
    fillet1_piece_17a = extrude(amount=528.517766953, mode=Mode.PRIVATE)
    fillet1_piece_17a = split(fillet1_piece_17a, bisect_by=Plane(origin=(264, 868.585786438, 40), z_dir=(1, 0, 0)), keep=Keep.TOP, mode=Mode.PRIVATE)
    with BuildSketch(Plane(origin=(264, 21, 40), x_dir=(1, 0, 0), z_dir=(0, 1, 0))) as fillet1_piece_17b_section:
        with BuildLine():
            CenterArc((FILLET1_R, FILLET1_R), FILLET1_R, 180, 90)
            Line((0, FILLET1_R), (0, 0))
            Line((0, 0), (FILLET1_R, 0))
        make_face()
    fillet1_piece_17b = extrude(amount=848.835786438, mode=Mode.PRIVATE)
    fillet1_piece_17b = split(fillet1_piece_17b, bisect_by=Plane(origin=(264, 444.792893219, -383.792893219), z_dir=(0, 0.7071067811865426, -0.7071067811865525)), keep=Keep.TOP, mode=Mode.PRIVATE)
    fillet1_piece_17 = fillet1_piece_17a & fillet1_piece_17b
    add(fillet1_piece_17, mode=Mode.SUBTRACT)
    with BuildSketch(Plane(origin=(264, 868.585786438, 40), x_dir=(0, -0.7071067811865132, -0.7071067811865818), z_dir=(-1, 0, 0))) as fillet1_piece_18a_section:
        with BuildLine():
            CenterArc((FILLET1_R * 0.414213562373, -FILLET1_R), FILLET1_R, 90, 45)
            Line((-FILLET1_R * 0.292893218813, -FILLET1_R * 0.292893218813), (0, 0))
            Line((0, 0), (FILLET1_R * 0.414213562373, 0))
        make_face()
    fillet1_piece_18a = extrude(amount=528.517766953, mode=Mode.PRIVATE)
    fillet1_piece_18a = split(fillet1_piece_18a, bisect_by=Plane(origin=(-264, 868.585786438, 40), z_dir=(-1, 0, 0)), keep=Keep.TOP, mode=Mode.PRIVATE)
    with BuildSketch(Plane(origin=(-264, 21, 40), x_dir=(-1, 0, 0), z_dir=(0, 1, 0))) as fillet1_piece_18b_section:
        with BuildLine():
            CenterArc((FILLET1_R, -FILLET1_R), FILLET1_R, 90, 90)
            Line((0, -FILLET1_R), (0, 0))
            Line((0, 0), (FILLET1_R, 0))
        make_face()
    fillet1_piece_18b = extrude(amount=848.835786438, mode=Mode.PRIVATE)
    fillet1_piece_18b = split(fillet1_piece_18b, bisect_by=Plane(origin=(-264, 444.792893219, -383.792893219), z_dir=(0, 0.7071067811865426, -0.7071067811865525)), keep=Keep.TOP, mode=Mode.PRIVATE)
    fillet1_piece_18 = fillet1_piece_18a & fillet1_piece_18b
    add(fillet1_piece_18, mode=Mode.SUBTRACT)

    # Fillet2: read off the stored shape, not the designer's step
    # Fillet2 outline → Fillet2 (cut)
    with SkipClean():  # the faces are left unmerged after this step: merging them gives an invalid solid
        with BuildSketch(Plane.YZ.offset(FILLET2_START)):
            with BuildLine():
                Line((870.777817459, 39.222182541), (870.424264069, 39.575735931))
                ThreePointArc((870.424264069, 39.575735931), (870.570710678, 39.22218254), (870.424264069, 38.86862915))
                Line((870.424264069, 38.86862915), (870.777817459, 39.222182541))
            make_face()
        extrude(amount=FILLET2_DEPTH, mode=Mode.SUBTRACT)
    add(part_1.part.scale(1), mode=Mode.REPLACE)  # the faces are merged on a copy


solid = part_1.part
